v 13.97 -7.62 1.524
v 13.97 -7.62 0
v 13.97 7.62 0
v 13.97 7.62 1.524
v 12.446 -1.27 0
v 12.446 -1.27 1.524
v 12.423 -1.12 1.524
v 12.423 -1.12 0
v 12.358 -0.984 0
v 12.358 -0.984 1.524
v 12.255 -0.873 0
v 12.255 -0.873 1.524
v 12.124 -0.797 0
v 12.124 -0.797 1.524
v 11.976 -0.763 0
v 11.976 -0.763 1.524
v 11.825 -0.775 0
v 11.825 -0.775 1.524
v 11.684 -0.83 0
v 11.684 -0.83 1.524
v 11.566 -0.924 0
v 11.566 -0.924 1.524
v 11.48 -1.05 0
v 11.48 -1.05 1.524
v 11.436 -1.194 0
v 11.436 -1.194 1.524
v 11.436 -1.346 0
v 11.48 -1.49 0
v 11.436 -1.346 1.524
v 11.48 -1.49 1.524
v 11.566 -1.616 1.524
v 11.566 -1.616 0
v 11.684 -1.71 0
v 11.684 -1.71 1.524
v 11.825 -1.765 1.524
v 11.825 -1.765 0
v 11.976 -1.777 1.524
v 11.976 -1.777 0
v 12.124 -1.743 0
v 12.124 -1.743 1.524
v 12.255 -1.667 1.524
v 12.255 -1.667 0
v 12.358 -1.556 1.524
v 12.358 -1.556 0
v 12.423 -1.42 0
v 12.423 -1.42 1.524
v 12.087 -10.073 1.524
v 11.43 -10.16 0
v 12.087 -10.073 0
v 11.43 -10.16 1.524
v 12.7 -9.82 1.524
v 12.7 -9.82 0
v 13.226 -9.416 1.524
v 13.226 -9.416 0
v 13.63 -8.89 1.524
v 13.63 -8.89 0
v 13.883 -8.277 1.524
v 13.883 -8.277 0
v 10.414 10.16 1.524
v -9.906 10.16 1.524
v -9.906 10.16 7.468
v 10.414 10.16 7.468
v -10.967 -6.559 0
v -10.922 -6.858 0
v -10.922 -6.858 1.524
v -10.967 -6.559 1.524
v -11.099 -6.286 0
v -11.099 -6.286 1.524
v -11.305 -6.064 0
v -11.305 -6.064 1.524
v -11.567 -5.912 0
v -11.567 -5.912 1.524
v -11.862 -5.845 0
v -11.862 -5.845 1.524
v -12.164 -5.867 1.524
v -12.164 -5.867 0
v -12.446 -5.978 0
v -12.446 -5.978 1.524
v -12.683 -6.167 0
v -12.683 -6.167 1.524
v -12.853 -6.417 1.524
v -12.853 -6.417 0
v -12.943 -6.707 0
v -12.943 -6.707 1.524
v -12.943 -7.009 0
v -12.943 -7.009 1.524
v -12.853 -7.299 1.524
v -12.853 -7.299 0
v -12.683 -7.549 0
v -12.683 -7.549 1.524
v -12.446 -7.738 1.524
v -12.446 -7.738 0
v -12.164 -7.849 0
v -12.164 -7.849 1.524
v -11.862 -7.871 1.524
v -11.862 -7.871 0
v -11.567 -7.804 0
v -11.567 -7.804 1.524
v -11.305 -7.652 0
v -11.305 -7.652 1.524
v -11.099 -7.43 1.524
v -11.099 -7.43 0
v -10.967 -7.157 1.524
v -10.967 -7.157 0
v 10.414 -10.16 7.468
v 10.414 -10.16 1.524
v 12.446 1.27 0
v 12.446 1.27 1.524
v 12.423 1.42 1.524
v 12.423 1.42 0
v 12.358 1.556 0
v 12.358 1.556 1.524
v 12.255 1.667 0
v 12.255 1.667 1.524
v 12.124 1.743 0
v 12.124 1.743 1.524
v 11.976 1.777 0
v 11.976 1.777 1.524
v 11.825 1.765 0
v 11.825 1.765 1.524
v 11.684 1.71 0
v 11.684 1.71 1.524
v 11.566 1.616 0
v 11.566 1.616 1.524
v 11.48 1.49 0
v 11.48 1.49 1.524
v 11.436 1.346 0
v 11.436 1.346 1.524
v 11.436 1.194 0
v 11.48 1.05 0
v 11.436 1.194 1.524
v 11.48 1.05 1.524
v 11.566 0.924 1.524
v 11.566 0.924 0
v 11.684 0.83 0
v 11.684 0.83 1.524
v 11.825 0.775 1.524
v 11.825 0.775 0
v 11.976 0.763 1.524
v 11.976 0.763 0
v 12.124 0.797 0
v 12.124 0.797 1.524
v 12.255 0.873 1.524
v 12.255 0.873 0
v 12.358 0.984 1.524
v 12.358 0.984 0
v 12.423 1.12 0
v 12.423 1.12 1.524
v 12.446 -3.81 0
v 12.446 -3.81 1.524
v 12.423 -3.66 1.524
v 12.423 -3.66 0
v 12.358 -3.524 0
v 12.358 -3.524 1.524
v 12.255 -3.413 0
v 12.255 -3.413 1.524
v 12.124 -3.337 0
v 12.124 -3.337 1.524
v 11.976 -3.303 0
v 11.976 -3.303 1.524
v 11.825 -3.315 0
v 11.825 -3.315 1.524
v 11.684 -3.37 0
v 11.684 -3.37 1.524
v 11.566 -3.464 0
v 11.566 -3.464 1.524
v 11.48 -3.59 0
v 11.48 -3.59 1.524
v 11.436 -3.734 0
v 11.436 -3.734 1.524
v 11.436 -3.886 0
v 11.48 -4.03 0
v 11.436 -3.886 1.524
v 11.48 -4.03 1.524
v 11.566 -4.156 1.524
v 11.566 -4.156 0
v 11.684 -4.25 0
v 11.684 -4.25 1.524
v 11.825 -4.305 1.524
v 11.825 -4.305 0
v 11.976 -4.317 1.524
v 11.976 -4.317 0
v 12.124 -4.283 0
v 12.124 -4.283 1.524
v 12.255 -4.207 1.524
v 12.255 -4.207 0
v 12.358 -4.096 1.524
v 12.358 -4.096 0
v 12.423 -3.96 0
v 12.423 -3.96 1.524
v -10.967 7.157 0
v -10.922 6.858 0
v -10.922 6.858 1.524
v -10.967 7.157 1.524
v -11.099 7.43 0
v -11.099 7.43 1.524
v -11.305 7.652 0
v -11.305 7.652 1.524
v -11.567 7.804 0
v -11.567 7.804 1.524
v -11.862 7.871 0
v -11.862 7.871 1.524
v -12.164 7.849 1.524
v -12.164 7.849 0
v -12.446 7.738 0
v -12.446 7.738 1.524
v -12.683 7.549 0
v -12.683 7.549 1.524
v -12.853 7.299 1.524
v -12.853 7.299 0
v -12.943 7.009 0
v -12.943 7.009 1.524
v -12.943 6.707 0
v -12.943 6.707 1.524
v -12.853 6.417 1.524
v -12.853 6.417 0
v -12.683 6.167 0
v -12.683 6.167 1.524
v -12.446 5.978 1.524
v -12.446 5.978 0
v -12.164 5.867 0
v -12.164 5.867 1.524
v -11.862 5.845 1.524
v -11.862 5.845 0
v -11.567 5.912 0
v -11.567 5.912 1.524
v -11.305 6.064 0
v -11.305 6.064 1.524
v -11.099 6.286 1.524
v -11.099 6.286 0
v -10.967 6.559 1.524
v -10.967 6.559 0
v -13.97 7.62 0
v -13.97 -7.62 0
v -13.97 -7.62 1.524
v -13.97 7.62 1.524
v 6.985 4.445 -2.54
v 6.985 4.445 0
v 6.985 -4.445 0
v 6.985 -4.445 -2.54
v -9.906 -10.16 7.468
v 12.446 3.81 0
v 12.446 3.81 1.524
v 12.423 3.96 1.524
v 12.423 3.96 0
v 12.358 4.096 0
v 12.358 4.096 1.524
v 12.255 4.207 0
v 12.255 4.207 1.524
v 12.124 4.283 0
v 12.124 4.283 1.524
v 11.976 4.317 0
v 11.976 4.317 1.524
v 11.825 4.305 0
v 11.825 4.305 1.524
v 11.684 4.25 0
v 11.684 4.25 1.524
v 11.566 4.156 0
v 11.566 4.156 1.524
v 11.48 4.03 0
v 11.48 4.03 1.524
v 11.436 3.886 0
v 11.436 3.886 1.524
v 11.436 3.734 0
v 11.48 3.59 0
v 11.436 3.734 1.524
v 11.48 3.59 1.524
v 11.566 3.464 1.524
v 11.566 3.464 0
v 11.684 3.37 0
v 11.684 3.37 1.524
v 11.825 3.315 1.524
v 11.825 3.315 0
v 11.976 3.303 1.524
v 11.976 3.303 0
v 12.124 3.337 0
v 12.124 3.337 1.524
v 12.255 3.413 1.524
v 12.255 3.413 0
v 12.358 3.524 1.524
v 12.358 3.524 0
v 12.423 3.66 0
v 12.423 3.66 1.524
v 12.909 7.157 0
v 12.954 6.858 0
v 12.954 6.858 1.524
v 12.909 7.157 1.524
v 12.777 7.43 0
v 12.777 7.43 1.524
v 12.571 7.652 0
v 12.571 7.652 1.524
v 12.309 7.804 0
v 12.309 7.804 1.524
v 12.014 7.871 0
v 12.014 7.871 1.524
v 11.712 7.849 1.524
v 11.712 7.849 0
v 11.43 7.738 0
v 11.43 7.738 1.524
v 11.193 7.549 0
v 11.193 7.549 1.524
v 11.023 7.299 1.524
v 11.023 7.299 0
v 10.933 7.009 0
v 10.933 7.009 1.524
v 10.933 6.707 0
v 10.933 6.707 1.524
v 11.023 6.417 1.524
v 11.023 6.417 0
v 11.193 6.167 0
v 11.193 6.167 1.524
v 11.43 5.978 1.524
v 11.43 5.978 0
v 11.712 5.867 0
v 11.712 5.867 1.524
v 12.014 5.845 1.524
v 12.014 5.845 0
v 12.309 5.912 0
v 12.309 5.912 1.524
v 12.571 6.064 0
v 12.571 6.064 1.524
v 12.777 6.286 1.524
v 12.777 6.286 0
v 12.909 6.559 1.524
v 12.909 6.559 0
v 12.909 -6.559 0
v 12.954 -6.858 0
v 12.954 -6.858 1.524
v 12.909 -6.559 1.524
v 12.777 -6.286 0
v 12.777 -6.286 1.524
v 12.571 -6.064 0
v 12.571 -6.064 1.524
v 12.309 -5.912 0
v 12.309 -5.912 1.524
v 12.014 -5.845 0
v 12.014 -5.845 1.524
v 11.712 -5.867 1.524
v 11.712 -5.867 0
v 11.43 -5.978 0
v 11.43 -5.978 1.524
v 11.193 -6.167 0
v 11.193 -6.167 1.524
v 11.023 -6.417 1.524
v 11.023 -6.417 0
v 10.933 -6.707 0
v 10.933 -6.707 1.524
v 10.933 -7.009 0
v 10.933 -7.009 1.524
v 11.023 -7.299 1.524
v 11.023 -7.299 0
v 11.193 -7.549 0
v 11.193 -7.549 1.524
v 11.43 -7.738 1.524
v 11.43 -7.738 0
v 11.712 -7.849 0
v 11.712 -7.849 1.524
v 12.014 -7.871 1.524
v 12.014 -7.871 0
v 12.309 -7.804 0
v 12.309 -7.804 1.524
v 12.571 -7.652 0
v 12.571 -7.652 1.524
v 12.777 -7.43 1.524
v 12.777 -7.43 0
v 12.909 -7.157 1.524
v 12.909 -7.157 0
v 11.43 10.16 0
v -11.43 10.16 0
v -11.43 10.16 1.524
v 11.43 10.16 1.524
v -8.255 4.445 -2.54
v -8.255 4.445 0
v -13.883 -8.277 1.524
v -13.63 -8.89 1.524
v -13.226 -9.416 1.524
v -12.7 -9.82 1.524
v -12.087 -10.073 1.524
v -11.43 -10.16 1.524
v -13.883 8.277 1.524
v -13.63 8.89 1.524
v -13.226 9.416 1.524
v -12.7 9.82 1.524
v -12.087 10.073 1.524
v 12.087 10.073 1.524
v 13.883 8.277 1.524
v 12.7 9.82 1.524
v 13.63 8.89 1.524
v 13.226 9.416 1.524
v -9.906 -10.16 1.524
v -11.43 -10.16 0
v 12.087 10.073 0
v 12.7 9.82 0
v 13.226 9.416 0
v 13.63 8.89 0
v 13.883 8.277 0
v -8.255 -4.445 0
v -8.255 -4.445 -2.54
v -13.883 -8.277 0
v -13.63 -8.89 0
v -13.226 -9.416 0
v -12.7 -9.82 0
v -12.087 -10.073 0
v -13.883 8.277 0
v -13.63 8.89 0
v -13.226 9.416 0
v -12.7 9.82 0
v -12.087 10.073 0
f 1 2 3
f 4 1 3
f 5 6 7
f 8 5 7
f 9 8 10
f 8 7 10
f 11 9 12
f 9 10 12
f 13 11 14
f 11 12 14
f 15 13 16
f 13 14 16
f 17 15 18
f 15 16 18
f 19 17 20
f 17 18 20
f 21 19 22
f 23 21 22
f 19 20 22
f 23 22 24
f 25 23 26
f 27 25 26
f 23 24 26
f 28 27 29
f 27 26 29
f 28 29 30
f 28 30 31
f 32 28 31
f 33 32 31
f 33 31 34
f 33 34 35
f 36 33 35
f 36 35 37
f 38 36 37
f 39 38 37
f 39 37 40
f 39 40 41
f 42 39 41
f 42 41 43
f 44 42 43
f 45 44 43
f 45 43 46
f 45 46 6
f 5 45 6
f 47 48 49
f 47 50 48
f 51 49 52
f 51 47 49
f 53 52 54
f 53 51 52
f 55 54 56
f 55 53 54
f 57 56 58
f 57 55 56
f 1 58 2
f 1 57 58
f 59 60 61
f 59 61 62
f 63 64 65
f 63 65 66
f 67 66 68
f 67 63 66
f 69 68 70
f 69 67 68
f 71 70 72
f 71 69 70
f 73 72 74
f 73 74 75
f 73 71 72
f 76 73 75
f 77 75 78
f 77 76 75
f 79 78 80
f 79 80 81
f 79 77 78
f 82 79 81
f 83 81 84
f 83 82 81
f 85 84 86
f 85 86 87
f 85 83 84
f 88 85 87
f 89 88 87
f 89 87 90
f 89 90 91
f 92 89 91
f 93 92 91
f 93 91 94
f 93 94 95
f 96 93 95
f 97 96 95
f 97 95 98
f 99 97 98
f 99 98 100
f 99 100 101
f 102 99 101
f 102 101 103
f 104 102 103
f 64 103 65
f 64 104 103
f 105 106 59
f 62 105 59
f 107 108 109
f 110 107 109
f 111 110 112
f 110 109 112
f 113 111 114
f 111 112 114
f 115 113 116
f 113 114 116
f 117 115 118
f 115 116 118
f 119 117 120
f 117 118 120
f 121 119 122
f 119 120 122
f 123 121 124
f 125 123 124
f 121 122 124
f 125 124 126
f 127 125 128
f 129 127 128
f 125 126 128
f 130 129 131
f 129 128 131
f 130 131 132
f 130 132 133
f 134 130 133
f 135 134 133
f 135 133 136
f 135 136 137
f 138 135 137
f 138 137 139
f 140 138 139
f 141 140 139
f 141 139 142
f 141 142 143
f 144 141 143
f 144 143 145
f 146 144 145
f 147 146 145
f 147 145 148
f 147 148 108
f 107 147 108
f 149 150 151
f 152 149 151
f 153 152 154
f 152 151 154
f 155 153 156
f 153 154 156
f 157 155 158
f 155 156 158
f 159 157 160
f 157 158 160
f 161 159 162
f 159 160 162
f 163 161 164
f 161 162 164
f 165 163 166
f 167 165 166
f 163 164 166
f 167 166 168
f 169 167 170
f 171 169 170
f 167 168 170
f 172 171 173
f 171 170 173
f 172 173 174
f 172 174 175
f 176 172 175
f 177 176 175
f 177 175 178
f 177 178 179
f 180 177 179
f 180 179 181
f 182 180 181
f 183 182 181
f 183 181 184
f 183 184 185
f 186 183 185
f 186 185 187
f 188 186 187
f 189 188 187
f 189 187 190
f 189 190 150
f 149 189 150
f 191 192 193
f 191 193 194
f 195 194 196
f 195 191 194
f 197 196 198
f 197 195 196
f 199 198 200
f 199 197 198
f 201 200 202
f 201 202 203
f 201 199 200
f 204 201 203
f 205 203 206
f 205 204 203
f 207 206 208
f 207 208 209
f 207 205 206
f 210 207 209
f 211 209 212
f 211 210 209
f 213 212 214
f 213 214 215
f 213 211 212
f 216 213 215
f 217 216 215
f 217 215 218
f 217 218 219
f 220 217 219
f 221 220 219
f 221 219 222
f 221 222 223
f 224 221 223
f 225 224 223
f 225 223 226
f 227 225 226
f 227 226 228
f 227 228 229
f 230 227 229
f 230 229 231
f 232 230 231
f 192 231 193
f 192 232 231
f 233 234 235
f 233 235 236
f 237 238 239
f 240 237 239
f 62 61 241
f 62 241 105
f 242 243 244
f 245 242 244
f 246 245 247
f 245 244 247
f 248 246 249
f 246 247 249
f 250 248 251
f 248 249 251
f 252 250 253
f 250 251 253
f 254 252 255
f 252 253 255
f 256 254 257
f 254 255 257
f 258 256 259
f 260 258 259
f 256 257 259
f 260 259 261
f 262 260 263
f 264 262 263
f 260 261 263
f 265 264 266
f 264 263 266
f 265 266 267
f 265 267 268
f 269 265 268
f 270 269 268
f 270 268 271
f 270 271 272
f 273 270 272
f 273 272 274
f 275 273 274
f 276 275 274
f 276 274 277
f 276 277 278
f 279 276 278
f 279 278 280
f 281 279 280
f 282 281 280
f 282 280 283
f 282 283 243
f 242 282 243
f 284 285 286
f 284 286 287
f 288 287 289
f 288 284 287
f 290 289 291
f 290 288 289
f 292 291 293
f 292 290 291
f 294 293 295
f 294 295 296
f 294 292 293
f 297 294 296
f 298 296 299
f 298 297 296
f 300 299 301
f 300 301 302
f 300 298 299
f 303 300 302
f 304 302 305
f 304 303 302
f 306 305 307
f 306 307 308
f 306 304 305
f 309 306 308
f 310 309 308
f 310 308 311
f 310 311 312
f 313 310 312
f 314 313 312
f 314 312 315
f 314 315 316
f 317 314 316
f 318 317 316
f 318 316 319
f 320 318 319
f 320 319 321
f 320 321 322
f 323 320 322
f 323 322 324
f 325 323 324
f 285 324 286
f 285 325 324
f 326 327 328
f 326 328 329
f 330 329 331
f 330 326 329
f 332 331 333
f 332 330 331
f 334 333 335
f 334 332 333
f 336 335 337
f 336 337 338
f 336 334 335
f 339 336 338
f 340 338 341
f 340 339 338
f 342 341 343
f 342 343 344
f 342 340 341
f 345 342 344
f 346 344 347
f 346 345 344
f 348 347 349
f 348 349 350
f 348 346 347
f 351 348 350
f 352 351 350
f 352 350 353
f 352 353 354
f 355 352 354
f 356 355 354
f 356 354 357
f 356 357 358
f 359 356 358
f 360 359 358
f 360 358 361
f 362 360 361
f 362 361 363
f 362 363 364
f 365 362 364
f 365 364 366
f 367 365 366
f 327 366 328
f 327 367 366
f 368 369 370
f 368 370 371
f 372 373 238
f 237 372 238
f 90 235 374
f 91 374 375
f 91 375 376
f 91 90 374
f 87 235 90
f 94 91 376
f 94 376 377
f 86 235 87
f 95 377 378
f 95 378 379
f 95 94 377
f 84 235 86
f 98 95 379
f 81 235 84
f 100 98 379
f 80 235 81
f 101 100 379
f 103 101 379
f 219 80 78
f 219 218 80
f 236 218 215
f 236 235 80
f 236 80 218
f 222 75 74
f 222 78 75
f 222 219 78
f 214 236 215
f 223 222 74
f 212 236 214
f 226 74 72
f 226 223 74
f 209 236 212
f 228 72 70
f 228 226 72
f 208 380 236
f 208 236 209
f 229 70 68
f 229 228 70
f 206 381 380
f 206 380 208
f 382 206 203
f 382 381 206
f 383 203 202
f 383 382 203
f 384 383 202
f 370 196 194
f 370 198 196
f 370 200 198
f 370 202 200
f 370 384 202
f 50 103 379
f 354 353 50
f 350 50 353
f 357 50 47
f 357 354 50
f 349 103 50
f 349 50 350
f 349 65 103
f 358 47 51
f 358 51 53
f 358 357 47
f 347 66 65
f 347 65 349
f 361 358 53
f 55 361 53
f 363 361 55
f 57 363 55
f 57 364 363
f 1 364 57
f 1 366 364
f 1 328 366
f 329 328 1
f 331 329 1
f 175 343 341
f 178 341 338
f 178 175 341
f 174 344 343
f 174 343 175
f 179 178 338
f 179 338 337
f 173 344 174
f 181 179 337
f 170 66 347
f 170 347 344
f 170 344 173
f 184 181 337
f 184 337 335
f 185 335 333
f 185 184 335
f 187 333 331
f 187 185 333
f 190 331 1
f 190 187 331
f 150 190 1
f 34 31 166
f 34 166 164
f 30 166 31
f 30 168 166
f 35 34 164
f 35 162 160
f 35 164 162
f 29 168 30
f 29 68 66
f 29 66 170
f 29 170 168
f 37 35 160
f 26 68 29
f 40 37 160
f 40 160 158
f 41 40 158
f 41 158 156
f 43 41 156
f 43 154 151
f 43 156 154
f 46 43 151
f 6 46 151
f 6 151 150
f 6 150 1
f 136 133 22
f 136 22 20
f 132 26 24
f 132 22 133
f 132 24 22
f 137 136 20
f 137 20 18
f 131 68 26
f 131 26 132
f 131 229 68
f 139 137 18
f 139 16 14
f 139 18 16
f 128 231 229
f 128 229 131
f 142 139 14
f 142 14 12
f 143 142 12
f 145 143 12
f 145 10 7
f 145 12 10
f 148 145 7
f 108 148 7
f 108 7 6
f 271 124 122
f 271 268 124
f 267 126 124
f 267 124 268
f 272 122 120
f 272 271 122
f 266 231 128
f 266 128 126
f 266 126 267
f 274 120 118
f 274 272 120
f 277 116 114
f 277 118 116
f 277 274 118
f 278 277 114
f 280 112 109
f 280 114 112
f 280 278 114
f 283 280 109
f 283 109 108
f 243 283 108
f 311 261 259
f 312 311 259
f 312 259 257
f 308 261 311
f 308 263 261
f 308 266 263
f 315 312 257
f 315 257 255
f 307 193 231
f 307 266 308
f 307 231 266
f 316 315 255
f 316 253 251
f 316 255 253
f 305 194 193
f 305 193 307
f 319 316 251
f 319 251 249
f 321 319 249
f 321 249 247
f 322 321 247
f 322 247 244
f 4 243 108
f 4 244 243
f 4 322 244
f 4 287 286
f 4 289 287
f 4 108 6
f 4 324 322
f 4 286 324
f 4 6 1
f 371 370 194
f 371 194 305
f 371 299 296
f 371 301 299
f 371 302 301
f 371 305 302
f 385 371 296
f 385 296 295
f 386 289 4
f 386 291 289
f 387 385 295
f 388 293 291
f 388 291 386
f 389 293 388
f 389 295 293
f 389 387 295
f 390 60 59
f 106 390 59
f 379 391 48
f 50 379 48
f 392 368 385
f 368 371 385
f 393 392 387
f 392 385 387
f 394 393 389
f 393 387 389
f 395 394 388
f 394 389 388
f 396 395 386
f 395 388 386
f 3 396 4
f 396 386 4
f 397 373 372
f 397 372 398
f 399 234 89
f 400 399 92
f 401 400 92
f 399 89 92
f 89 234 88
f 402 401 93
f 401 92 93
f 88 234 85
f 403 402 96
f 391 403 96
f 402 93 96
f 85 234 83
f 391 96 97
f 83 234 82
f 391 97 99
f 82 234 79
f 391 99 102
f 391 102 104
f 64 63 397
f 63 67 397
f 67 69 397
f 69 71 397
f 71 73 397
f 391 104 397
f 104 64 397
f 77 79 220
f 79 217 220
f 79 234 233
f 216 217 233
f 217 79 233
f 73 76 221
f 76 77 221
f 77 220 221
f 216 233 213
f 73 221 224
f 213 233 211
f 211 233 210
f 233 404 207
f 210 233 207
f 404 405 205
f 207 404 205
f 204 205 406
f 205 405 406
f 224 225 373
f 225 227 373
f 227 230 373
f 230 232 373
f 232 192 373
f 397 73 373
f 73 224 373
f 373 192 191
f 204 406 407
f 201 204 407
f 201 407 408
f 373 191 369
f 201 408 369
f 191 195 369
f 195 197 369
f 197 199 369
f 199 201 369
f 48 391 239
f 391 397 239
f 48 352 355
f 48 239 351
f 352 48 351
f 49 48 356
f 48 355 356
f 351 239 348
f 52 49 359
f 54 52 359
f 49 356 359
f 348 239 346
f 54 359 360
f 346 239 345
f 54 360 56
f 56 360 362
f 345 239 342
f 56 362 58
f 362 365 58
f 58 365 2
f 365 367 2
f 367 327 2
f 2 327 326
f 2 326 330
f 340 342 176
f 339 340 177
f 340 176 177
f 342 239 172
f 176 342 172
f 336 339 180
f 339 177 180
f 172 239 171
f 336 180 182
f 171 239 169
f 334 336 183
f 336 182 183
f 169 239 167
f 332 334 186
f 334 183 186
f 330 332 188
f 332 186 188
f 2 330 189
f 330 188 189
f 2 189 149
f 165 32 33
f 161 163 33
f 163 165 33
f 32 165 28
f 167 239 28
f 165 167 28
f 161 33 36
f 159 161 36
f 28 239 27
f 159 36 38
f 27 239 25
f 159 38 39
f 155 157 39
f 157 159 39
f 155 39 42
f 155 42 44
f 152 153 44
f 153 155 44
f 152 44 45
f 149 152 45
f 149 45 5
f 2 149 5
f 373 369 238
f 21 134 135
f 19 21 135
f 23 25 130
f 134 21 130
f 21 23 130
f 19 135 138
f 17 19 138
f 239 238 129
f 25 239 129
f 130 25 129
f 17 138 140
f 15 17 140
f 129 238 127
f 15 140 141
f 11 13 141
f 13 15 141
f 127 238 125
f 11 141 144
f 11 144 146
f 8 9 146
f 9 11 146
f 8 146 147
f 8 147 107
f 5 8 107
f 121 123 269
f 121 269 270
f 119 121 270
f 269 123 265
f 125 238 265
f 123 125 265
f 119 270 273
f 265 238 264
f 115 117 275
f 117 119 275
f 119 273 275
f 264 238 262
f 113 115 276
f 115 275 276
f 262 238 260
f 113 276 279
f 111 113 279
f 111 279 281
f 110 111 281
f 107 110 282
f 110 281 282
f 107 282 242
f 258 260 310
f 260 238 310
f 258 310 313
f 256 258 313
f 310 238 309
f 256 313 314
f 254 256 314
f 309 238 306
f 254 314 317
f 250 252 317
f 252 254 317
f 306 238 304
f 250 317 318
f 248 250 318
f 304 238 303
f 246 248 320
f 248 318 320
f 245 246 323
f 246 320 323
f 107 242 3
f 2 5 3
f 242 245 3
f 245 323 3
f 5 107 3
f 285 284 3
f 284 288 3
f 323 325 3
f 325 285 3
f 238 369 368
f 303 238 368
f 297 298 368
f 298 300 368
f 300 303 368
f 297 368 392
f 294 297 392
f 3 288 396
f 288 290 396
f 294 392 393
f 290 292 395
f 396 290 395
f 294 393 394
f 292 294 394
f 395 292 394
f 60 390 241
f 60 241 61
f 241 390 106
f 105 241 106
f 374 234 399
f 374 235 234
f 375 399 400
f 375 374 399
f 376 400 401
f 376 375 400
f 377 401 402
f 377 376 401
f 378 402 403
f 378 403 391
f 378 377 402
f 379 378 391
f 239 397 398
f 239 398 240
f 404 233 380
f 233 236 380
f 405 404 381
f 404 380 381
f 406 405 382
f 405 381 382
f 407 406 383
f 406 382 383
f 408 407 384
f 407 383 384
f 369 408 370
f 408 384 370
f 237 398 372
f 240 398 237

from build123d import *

# Parameters (mm, degrees)
F0_W     = 27.94
F0_H     = 20.32
F0_R     = 1.016
F1_DEPTH = 1.524
F2_R     = 2.54
F3_W     = 20.32
F3_H     = 20.32
F4_DEPTH = 5.9436
F5_R     = 0.508
F6_DEPTH = 1.525
F7_W     = 15.24
F7_H     = 8.89
F8_DEPTH = 2.54


with BuildPart() as f1:
    # F0 (on Top) → F1 (new body)
    with BuildSketch(Plane.XY):
        Rectangle(F0_W, F0_H)
        with Locations((-11.938, -6.858)):
            Circle(F0_R, mode=Mode.SUBTRACT)
        with Locations((11.938, -6.858)):
            Circle(F0_R, mode=Mode.SUBTRACT)
        with Locations((-11.938, 6.858)):
            Circle(F0_R, mode=Mode.SUBTRACT)
        with Locations((11.938, 6.858)):
            Circle(F0_R, mode=Mode.SUBTRACT)
    extrude(amount=F1_DEPTH)

    # F2
    f2_edges = [f1.edges().sort_by_distance(p)[0] for p in [
        (13.97, -10.16, 0.762),
        (-13.97, -10.16, 0.762),
        (-13.97, 10.16, 0.762),
        (13.97, 10.16, 0.762),
    ]]
    fillet(f2_edges, radius=F2_R)

    # F5 (on face) → F6 (cut, through all)
    with BuildSketch(Plane.XY.offset(1.524)):
        with Locations((11.938, 3.81)):
            Circle(F5_R)
        with Locations((11.938, 1.27)):
            Circle(F5_R)
        with Locations((11.938, -1.27)):
            Circle(F5_R)
        with Locations((11.938, -3.81)):
            Circle(F5_R)
    extrude(amount=-F6_DEPTH, mode=Mode.SUBTRACT)

    # F7 (on face) → F8 (join)
    with BuildSketch(Plane(origin=(0, 0, 0), x_dir=(1, 0, 0), z_dir=(0, 0, -1))):
        with Locations((-0.635, 0)):
            Rectangle(F7_W, F7_H)
    extrude(amount=F8_DEPTH)


with BuildPart() as f4:
    # F3 (on face) → F4 (new body)
    with BuildSketch(Plane.XY.offset(1.524)):
        with Locations((0.254, 0)):
            Rectangle(F3_W, F3_H)
    extrude(amount=F4_DEPTH)


solid = Compound([f1.part, f4.part])
